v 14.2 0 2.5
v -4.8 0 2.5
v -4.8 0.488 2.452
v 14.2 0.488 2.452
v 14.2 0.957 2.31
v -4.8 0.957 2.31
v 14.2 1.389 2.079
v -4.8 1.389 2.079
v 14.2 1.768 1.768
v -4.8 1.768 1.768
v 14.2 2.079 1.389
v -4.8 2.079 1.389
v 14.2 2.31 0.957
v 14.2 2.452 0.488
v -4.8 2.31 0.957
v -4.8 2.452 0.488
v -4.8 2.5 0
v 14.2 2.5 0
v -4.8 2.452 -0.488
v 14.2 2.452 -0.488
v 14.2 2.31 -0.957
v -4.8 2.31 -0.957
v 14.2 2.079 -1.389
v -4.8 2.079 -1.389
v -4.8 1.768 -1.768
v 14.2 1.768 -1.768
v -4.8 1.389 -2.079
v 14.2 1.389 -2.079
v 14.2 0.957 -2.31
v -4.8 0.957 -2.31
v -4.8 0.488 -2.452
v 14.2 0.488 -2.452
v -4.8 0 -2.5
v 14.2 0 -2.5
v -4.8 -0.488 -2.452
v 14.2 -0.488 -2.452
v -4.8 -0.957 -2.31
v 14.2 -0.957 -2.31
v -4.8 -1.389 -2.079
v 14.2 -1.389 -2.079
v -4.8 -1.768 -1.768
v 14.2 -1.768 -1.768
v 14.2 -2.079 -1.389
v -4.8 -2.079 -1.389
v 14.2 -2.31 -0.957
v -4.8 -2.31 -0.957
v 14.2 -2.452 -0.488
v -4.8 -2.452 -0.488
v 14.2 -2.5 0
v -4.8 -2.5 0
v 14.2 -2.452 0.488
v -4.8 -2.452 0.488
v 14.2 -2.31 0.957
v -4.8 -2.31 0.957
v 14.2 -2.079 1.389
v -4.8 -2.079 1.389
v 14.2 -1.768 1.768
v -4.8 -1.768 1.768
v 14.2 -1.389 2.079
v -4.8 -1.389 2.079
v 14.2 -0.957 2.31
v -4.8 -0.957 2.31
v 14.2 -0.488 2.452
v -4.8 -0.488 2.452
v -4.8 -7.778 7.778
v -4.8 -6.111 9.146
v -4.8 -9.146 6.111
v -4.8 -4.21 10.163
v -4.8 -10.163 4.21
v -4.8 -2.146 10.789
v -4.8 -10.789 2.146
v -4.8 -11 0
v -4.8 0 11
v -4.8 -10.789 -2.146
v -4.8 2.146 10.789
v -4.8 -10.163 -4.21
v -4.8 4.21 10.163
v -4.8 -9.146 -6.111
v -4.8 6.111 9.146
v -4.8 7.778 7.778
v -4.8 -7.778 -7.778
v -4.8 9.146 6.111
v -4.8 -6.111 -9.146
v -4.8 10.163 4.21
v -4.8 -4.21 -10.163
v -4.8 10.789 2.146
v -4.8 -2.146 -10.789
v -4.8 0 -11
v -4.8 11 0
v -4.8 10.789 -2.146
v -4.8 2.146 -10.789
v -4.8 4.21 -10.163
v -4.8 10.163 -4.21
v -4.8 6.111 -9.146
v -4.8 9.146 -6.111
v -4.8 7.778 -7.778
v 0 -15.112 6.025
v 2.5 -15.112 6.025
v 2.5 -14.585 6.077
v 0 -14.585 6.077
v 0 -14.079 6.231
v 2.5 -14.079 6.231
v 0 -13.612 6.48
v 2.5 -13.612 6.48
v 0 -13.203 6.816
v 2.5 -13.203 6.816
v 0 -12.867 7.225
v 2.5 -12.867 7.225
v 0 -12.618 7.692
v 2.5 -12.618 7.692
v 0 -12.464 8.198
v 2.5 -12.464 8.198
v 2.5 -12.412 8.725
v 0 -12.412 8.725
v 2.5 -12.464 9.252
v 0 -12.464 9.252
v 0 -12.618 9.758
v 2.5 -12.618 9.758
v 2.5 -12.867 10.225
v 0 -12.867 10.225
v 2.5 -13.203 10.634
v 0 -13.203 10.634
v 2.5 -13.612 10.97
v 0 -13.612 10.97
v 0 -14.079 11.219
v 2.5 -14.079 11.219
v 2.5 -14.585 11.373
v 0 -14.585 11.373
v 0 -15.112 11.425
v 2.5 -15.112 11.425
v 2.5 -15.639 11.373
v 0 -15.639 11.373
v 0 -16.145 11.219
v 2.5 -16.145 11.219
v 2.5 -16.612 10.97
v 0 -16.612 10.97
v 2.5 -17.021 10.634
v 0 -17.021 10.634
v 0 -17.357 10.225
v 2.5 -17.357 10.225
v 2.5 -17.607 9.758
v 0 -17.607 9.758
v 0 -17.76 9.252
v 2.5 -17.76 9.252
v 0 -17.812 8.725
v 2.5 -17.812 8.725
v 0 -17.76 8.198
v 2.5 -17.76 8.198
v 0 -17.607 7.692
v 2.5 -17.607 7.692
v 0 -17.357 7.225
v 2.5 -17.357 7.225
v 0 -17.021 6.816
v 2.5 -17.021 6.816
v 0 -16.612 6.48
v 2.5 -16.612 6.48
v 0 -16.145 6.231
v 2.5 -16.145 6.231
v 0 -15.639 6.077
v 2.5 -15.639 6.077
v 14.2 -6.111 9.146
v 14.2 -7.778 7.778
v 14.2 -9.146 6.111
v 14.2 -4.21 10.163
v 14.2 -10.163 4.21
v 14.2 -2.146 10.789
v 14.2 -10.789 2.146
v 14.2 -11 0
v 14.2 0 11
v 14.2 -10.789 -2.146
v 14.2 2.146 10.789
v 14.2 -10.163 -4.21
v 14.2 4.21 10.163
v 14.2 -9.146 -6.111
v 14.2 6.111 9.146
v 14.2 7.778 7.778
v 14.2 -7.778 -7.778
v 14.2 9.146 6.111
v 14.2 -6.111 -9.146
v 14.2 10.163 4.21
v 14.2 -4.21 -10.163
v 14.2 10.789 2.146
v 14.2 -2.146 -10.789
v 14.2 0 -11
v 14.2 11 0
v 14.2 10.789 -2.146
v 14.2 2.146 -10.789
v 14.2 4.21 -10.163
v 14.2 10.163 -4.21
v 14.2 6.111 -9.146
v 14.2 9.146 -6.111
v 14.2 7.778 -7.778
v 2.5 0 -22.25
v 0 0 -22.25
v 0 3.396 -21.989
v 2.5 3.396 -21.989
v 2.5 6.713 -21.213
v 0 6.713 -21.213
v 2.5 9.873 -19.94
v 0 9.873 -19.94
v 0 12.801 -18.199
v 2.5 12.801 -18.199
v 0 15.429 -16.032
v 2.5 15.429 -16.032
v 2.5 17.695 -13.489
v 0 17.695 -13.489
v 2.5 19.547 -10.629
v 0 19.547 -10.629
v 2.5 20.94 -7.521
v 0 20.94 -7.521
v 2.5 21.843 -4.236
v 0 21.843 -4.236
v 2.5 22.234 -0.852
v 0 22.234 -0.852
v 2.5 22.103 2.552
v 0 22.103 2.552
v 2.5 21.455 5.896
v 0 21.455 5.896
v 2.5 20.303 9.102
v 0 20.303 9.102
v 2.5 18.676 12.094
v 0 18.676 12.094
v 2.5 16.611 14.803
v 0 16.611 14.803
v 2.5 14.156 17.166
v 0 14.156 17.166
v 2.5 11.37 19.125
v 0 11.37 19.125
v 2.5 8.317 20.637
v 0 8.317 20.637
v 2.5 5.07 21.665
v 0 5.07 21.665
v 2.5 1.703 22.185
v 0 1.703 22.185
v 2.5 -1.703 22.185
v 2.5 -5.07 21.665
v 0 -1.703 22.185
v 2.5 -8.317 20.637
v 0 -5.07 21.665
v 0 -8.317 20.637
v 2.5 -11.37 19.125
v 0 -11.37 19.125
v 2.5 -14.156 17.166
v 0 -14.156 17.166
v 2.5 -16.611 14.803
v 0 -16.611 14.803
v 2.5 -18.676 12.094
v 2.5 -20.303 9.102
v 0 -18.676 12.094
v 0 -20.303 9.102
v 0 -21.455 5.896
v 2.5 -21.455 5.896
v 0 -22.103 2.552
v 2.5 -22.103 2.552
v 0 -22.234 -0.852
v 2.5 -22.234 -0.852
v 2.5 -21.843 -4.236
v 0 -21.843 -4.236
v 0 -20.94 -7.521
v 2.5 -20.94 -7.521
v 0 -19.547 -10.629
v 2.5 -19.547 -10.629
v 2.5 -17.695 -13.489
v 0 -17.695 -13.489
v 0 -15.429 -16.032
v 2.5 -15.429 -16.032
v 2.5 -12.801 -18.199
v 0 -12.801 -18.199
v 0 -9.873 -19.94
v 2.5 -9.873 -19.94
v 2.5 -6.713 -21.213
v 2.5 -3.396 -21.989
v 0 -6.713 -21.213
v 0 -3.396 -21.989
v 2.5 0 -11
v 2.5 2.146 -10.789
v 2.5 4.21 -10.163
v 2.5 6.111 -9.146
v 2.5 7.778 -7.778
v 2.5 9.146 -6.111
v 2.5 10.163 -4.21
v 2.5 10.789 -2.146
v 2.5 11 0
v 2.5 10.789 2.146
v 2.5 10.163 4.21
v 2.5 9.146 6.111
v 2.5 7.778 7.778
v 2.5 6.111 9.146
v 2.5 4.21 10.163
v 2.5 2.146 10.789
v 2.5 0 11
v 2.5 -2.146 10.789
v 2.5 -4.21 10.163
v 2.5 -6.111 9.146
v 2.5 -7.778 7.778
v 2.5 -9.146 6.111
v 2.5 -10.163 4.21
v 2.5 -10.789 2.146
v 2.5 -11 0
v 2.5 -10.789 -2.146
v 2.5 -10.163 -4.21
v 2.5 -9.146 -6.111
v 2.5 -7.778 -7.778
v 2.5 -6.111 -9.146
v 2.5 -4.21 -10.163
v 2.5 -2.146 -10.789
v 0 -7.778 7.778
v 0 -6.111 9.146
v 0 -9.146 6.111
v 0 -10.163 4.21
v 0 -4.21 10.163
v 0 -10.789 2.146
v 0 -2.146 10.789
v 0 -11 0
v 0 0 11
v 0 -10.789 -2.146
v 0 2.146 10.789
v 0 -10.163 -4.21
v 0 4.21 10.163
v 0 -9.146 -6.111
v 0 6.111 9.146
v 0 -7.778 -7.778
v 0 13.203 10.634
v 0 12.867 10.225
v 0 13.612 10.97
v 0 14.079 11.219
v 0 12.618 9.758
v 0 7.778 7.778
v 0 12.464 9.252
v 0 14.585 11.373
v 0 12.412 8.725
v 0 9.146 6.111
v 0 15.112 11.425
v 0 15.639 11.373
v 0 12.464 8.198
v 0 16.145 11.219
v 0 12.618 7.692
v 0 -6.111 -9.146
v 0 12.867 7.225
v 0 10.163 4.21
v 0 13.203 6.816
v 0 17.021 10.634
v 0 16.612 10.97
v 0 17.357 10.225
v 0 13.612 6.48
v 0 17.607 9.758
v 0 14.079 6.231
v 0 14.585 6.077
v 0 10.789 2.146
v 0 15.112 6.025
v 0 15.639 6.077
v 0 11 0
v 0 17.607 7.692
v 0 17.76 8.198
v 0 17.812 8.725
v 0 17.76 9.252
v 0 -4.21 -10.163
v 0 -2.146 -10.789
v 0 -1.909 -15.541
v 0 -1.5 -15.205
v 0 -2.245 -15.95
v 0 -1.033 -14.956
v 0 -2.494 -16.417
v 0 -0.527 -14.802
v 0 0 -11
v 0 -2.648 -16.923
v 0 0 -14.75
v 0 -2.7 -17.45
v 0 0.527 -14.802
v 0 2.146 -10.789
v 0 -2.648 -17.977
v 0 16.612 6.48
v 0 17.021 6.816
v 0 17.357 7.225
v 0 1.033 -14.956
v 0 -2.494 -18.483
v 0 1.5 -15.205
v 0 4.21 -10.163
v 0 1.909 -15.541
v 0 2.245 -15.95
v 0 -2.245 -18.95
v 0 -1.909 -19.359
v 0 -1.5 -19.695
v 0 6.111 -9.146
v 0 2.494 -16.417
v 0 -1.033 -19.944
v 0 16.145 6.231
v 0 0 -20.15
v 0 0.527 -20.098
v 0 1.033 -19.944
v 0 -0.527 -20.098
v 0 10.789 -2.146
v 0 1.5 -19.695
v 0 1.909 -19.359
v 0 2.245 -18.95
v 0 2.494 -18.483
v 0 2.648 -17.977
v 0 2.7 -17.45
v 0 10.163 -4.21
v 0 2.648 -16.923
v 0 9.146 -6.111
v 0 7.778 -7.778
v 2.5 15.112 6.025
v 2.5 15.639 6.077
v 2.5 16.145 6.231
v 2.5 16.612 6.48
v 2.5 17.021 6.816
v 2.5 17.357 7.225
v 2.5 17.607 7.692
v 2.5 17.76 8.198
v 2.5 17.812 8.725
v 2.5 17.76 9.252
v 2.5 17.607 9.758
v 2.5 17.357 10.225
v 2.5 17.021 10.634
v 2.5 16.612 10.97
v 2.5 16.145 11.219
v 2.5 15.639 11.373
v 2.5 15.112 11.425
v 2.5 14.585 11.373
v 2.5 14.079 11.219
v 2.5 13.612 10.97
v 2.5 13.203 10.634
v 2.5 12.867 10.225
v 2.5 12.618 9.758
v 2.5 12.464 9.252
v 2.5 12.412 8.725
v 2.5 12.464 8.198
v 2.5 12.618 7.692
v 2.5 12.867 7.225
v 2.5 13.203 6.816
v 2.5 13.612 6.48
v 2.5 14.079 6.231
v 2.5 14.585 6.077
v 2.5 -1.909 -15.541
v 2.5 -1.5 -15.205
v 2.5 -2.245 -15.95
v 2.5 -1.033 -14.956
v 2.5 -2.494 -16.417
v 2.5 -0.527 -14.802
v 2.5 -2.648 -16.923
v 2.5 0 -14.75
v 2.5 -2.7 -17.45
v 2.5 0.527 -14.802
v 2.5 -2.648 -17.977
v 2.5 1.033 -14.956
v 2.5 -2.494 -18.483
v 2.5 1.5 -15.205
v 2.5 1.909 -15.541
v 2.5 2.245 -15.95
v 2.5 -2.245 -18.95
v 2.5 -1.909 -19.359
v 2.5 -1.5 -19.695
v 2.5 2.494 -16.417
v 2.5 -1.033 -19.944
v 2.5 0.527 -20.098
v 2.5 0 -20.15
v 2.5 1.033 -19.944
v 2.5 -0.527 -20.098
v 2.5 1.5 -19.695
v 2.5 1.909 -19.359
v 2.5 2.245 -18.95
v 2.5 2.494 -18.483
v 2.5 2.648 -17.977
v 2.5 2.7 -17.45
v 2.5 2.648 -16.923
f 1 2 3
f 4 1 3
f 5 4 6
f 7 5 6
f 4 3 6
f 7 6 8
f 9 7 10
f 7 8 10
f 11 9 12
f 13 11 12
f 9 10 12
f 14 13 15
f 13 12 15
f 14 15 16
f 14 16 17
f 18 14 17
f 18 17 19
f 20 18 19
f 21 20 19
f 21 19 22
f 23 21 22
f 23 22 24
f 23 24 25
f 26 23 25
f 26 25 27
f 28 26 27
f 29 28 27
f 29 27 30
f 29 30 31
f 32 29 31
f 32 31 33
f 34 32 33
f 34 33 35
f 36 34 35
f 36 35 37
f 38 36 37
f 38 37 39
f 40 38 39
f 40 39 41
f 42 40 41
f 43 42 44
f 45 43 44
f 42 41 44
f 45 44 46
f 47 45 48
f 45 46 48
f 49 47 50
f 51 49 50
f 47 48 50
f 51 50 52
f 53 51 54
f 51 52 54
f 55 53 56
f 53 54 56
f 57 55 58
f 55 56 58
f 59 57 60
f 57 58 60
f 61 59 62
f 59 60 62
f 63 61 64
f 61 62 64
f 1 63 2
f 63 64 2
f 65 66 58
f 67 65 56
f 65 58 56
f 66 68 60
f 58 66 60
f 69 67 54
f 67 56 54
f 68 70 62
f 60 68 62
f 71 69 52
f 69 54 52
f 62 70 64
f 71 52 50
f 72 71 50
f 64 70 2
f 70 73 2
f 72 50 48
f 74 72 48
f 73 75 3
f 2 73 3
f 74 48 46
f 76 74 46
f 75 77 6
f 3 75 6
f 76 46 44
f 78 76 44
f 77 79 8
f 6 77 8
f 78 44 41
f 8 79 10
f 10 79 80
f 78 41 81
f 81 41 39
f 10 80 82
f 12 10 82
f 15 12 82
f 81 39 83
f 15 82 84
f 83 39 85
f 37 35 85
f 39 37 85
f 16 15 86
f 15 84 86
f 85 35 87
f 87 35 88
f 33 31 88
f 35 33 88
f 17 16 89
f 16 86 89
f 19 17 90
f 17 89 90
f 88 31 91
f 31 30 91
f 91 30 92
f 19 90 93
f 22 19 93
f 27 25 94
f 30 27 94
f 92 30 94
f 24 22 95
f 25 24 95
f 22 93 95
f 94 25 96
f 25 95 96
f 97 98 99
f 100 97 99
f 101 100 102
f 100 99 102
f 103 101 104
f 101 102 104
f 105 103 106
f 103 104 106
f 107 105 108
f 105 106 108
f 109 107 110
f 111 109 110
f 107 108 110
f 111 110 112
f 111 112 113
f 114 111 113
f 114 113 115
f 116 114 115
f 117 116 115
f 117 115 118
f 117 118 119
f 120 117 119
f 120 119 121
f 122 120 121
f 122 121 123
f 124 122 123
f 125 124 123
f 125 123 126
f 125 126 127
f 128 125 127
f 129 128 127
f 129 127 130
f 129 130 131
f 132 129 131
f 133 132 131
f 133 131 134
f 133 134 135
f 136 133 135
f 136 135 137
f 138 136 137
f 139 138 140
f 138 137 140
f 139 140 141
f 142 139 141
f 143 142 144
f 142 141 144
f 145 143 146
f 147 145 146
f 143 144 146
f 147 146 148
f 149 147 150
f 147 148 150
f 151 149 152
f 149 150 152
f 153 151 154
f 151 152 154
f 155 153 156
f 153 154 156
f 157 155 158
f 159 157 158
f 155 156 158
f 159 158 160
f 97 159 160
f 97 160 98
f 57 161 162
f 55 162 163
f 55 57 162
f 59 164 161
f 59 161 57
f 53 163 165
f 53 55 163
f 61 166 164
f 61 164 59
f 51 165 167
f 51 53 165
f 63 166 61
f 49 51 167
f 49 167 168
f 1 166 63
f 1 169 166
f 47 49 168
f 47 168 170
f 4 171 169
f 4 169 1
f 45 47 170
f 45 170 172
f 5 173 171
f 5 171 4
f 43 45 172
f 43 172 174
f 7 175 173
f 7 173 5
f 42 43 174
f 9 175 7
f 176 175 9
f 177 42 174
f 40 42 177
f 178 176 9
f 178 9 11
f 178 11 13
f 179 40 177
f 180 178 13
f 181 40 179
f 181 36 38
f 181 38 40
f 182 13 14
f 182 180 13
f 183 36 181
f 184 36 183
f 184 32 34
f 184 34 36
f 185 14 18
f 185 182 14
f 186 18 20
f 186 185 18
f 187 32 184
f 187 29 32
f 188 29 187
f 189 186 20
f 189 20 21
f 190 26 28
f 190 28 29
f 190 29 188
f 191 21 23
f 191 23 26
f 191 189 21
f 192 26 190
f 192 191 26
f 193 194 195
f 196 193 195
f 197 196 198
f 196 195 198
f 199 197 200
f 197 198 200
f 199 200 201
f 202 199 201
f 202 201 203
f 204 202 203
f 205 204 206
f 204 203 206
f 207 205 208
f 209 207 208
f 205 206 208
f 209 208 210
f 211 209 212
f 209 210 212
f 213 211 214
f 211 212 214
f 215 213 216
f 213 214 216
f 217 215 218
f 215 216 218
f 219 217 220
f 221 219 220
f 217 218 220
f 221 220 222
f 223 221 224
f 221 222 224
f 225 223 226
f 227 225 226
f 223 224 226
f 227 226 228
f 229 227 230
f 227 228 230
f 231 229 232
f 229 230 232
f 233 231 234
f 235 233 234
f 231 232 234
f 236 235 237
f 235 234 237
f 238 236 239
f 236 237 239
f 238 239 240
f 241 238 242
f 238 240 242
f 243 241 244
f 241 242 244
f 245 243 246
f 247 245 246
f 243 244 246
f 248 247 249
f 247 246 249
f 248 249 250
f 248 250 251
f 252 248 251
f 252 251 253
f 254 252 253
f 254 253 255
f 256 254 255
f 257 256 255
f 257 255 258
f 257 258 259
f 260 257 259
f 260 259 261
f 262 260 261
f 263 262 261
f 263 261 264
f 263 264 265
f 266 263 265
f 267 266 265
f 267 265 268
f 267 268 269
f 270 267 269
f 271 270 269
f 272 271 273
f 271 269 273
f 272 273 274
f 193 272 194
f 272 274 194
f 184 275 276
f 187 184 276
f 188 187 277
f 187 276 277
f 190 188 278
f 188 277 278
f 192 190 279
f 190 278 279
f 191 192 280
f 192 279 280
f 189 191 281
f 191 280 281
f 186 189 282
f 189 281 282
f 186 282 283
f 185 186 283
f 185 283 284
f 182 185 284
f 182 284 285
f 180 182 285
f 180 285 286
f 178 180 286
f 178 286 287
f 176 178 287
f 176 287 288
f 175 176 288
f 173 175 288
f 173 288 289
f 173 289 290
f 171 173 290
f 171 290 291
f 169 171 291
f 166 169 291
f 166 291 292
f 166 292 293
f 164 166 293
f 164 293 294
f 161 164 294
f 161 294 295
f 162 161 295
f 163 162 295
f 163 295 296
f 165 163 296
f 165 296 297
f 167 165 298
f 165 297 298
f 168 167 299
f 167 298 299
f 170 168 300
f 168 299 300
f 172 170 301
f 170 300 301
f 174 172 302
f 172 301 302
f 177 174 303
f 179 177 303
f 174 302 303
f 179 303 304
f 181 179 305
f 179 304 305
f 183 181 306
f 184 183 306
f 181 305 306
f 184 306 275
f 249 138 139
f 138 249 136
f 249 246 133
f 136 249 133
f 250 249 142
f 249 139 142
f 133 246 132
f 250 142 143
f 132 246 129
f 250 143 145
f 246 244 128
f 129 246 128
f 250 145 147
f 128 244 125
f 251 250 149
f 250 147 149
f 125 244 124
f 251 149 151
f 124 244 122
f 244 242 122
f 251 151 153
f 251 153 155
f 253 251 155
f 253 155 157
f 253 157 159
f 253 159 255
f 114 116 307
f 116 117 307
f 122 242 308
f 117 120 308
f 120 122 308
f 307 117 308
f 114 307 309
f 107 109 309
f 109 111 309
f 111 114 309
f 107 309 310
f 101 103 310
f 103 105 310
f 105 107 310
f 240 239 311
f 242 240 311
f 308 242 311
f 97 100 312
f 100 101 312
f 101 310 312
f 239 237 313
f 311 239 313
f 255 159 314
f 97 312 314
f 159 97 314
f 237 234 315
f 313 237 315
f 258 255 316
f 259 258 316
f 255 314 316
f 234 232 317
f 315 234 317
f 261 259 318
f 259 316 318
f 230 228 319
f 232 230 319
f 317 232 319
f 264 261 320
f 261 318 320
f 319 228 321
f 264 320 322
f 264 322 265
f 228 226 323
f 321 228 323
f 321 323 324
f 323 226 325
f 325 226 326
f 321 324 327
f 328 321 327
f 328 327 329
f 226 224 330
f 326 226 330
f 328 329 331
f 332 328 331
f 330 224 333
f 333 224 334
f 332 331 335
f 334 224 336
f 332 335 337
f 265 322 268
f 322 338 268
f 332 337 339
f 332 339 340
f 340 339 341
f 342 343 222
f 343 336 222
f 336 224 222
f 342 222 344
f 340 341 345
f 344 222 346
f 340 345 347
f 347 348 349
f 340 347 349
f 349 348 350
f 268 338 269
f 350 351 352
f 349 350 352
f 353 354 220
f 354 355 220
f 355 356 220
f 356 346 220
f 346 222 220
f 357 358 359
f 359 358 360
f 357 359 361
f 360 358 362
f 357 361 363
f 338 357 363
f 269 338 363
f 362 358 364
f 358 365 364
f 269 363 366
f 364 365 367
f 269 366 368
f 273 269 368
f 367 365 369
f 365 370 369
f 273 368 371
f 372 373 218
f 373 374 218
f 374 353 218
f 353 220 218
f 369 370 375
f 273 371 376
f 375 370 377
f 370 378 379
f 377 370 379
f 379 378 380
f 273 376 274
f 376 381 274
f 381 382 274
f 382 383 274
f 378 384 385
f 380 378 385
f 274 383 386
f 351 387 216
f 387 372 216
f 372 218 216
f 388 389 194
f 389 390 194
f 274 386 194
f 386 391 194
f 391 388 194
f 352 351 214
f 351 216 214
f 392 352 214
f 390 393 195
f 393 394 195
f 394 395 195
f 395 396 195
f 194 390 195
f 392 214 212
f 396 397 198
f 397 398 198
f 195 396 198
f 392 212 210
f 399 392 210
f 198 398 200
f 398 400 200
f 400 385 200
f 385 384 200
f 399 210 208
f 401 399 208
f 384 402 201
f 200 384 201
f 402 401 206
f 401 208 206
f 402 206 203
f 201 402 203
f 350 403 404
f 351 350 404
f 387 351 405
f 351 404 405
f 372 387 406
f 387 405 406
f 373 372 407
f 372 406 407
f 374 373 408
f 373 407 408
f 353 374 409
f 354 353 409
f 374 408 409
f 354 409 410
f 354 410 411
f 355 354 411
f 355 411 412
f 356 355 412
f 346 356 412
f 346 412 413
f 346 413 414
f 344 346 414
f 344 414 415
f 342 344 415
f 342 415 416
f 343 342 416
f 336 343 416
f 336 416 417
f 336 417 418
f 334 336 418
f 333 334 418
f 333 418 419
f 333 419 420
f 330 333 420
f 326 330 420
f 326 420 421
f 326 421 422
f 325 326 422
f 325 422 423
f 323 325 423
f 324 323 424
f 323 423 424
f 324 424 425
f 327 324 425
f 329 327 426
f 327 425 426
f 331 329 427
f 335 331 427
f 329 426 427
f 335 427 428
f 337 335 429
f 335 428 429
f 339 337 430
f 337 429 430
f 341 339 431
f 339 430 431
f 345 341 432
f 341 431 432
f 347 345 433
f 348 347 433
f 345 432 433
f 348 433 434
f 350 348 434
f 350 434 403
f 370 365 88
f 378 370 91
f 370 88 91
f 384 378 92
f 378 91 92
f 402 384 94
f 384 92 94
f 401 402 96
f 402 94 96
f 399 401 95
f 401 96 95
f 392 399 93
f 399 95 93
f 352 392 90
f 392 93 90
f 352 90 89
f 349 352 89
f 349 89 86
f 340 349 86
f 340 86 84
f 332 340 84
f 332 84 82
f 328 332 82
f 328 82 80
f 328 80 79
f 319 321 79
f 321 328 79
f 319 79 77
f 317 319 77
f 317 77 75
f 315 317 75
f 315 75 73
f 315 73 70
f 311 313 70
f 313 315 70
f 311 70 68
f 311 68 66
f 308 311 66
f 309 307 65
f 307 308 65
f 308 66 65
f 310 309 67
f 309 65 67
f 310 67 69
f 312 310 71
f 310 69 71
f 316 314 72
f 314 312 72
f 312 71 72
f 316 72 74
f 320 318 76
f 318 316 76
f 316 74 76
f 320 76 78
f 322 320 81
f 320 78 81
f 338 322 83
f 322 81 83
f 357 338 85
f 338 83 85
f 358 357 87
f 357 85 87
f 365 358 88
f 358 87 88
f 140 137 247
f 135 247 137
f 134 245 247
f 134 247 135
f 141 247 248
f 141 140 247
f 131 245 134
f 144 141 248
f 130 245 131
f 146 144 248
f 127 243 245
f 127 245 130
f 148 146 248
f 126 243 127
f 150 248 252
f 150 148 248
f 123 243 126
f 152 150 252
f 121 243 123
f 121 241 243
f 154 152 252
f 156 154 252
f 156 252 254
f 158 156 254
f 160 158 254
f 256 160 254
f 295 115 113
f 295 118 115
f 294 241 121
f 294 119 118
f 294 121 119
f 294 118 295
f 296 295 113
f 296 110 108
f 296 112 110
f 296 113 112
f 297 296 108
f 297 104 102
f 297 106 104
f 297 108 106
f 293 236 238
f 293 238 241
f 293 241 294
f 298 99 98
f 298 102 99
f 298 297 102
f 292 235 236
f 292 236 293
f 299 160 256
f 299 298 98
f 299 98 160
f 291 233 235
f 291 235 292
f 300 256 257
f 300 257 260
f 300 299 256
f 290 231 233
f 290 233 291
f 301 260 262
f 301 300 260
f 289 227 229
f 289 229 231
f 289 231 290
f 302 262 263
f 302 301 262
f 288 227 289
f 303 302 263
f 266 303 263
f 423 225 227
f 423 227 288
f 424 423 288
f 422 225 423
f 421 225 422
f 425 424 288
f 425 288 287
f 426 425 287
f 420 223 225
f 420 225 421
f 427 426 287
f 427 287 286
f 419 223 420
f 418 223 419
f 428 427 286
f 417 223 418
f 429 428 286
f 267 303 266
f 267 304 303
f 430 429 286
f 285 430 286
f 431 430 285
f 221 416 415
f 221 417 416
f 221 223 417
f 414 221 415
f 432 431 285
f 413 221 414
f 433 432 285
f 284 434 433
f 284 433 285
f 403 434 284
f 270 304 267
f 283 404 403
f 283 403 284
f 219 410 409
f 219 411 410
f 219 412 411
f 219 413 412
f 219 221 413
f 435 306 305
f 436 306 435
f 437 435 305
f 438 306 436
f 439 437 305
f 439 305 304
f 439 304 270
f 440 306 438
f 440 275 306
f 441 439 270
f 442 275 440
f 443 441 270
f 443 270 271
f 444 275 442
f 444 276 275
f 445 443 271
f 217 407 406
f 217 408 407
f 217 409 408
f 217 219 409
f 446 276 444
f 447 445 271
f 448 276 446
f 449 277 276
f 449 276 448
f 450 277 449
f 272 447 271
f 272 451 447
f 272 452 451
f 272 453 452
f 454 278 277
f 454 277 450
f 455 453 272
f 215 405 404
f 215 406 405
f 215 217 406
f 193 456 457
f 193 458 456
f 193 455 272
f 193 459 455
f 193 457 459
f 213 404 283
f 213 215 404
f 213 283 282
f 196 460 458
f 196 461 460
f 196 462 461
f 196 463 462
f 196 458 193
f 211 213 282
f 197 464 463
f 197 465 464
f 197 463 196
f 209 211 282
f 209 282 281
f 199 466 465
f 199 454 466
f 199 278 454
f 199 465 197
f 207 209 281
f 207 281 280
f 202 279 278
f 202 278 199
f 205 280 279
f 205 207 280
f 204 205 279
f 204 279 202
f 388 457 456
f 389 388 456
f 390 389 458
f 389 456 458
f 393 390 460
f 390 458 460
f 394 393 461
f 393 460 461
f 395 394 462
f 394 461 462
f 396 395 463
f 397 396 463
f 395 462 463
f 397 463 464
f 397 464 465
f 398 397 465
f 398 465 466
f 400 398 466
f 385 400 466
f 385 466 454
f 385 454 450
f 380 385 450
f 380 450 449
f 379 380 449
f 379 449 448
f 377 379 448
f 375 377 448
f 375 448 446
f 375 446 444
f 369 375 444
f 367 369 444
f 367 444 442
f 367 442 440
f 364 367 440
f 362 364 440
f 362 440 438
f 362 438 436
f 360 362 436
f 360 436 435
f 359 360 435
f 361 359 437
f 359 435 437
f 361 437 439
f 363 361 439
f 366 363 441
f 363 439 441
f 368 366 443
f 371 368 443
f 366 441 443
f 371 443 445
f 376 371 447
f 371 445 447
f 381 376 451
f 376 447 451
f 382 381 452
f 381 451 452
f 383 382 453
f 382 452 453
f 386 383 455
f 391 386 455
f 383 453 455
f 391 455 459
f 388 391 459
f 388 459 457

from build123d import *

# Parameters (mm, degrees)
SKETCH1_R           = 22.25
BOSS_EXTRUDE1_DEPTH = 2.5
SKETCH2_R           = 2.7
CUT_EXTRUDE1_DEPTH  = 32.565408282
BOSS_EXTRUDE2_START = -7.3
SKETCH3_R           = 11
BOSS_EXTRUDE2_DEPTH = 19
SKETCH4_R           = 2.5
CUT_EXTRUDE2_DEPTH  = 37.757652265


with BuildPart() as part:
    # Sketch1 → Boss-Extrude1 (new body)
    with BuildSketch(Plane(origin=(0, 0, 0), x_dir=(0, 0, -1), z_dir=(1, 0, 0))):
        Circle(SKETCH1_R)
    extrude(amount=BOSS_EXTRUDE1_DEPTH)

    # Sketch2 → Cut-Extrude1 (cut, through all)
    with BuildSketch(Plane(origin=(2.5, 0, 0), x_dir=(0, 0, -1), z_dir=(1, 0, 0))):
        with Locations((17.45, 0)):
            Circle(SKETCH2_R)
        with Locations((-8.725, 15.112143296)):
            Circle(SKETCH2_R)
        with Locations((-8.725, -15.112143296)):
            Circle(SKETCH2_R)
    extrude(amount=-CUT_EXTRUDE1_DEPTH, mode=Mode.SUBTRACT)

    # Sketch3 → Boss-Extrude2 (add)
    with BuildSketch(Plane(origin=(2.5, 0, 0), x_dir=(0, 0, -1), z_dir=(1, 0, 0)).offset(BOSS_EXTRUDE2_START)):
        Circle(SKETCH3_R)
    extrude(amount=BOSS_EXTRUDE2_DEPTH)

    # Sketch4 → Cut-Extrude2 (cut, through all)
    with BuildSketch(Plane.ZY.offset(4.8)):
        Circle(SKETCH4_R)
    extrude(amount=-CUT_EXTRUDE2_DEPTH, mode=Mode.SUBTRACT)


solid = part.part
